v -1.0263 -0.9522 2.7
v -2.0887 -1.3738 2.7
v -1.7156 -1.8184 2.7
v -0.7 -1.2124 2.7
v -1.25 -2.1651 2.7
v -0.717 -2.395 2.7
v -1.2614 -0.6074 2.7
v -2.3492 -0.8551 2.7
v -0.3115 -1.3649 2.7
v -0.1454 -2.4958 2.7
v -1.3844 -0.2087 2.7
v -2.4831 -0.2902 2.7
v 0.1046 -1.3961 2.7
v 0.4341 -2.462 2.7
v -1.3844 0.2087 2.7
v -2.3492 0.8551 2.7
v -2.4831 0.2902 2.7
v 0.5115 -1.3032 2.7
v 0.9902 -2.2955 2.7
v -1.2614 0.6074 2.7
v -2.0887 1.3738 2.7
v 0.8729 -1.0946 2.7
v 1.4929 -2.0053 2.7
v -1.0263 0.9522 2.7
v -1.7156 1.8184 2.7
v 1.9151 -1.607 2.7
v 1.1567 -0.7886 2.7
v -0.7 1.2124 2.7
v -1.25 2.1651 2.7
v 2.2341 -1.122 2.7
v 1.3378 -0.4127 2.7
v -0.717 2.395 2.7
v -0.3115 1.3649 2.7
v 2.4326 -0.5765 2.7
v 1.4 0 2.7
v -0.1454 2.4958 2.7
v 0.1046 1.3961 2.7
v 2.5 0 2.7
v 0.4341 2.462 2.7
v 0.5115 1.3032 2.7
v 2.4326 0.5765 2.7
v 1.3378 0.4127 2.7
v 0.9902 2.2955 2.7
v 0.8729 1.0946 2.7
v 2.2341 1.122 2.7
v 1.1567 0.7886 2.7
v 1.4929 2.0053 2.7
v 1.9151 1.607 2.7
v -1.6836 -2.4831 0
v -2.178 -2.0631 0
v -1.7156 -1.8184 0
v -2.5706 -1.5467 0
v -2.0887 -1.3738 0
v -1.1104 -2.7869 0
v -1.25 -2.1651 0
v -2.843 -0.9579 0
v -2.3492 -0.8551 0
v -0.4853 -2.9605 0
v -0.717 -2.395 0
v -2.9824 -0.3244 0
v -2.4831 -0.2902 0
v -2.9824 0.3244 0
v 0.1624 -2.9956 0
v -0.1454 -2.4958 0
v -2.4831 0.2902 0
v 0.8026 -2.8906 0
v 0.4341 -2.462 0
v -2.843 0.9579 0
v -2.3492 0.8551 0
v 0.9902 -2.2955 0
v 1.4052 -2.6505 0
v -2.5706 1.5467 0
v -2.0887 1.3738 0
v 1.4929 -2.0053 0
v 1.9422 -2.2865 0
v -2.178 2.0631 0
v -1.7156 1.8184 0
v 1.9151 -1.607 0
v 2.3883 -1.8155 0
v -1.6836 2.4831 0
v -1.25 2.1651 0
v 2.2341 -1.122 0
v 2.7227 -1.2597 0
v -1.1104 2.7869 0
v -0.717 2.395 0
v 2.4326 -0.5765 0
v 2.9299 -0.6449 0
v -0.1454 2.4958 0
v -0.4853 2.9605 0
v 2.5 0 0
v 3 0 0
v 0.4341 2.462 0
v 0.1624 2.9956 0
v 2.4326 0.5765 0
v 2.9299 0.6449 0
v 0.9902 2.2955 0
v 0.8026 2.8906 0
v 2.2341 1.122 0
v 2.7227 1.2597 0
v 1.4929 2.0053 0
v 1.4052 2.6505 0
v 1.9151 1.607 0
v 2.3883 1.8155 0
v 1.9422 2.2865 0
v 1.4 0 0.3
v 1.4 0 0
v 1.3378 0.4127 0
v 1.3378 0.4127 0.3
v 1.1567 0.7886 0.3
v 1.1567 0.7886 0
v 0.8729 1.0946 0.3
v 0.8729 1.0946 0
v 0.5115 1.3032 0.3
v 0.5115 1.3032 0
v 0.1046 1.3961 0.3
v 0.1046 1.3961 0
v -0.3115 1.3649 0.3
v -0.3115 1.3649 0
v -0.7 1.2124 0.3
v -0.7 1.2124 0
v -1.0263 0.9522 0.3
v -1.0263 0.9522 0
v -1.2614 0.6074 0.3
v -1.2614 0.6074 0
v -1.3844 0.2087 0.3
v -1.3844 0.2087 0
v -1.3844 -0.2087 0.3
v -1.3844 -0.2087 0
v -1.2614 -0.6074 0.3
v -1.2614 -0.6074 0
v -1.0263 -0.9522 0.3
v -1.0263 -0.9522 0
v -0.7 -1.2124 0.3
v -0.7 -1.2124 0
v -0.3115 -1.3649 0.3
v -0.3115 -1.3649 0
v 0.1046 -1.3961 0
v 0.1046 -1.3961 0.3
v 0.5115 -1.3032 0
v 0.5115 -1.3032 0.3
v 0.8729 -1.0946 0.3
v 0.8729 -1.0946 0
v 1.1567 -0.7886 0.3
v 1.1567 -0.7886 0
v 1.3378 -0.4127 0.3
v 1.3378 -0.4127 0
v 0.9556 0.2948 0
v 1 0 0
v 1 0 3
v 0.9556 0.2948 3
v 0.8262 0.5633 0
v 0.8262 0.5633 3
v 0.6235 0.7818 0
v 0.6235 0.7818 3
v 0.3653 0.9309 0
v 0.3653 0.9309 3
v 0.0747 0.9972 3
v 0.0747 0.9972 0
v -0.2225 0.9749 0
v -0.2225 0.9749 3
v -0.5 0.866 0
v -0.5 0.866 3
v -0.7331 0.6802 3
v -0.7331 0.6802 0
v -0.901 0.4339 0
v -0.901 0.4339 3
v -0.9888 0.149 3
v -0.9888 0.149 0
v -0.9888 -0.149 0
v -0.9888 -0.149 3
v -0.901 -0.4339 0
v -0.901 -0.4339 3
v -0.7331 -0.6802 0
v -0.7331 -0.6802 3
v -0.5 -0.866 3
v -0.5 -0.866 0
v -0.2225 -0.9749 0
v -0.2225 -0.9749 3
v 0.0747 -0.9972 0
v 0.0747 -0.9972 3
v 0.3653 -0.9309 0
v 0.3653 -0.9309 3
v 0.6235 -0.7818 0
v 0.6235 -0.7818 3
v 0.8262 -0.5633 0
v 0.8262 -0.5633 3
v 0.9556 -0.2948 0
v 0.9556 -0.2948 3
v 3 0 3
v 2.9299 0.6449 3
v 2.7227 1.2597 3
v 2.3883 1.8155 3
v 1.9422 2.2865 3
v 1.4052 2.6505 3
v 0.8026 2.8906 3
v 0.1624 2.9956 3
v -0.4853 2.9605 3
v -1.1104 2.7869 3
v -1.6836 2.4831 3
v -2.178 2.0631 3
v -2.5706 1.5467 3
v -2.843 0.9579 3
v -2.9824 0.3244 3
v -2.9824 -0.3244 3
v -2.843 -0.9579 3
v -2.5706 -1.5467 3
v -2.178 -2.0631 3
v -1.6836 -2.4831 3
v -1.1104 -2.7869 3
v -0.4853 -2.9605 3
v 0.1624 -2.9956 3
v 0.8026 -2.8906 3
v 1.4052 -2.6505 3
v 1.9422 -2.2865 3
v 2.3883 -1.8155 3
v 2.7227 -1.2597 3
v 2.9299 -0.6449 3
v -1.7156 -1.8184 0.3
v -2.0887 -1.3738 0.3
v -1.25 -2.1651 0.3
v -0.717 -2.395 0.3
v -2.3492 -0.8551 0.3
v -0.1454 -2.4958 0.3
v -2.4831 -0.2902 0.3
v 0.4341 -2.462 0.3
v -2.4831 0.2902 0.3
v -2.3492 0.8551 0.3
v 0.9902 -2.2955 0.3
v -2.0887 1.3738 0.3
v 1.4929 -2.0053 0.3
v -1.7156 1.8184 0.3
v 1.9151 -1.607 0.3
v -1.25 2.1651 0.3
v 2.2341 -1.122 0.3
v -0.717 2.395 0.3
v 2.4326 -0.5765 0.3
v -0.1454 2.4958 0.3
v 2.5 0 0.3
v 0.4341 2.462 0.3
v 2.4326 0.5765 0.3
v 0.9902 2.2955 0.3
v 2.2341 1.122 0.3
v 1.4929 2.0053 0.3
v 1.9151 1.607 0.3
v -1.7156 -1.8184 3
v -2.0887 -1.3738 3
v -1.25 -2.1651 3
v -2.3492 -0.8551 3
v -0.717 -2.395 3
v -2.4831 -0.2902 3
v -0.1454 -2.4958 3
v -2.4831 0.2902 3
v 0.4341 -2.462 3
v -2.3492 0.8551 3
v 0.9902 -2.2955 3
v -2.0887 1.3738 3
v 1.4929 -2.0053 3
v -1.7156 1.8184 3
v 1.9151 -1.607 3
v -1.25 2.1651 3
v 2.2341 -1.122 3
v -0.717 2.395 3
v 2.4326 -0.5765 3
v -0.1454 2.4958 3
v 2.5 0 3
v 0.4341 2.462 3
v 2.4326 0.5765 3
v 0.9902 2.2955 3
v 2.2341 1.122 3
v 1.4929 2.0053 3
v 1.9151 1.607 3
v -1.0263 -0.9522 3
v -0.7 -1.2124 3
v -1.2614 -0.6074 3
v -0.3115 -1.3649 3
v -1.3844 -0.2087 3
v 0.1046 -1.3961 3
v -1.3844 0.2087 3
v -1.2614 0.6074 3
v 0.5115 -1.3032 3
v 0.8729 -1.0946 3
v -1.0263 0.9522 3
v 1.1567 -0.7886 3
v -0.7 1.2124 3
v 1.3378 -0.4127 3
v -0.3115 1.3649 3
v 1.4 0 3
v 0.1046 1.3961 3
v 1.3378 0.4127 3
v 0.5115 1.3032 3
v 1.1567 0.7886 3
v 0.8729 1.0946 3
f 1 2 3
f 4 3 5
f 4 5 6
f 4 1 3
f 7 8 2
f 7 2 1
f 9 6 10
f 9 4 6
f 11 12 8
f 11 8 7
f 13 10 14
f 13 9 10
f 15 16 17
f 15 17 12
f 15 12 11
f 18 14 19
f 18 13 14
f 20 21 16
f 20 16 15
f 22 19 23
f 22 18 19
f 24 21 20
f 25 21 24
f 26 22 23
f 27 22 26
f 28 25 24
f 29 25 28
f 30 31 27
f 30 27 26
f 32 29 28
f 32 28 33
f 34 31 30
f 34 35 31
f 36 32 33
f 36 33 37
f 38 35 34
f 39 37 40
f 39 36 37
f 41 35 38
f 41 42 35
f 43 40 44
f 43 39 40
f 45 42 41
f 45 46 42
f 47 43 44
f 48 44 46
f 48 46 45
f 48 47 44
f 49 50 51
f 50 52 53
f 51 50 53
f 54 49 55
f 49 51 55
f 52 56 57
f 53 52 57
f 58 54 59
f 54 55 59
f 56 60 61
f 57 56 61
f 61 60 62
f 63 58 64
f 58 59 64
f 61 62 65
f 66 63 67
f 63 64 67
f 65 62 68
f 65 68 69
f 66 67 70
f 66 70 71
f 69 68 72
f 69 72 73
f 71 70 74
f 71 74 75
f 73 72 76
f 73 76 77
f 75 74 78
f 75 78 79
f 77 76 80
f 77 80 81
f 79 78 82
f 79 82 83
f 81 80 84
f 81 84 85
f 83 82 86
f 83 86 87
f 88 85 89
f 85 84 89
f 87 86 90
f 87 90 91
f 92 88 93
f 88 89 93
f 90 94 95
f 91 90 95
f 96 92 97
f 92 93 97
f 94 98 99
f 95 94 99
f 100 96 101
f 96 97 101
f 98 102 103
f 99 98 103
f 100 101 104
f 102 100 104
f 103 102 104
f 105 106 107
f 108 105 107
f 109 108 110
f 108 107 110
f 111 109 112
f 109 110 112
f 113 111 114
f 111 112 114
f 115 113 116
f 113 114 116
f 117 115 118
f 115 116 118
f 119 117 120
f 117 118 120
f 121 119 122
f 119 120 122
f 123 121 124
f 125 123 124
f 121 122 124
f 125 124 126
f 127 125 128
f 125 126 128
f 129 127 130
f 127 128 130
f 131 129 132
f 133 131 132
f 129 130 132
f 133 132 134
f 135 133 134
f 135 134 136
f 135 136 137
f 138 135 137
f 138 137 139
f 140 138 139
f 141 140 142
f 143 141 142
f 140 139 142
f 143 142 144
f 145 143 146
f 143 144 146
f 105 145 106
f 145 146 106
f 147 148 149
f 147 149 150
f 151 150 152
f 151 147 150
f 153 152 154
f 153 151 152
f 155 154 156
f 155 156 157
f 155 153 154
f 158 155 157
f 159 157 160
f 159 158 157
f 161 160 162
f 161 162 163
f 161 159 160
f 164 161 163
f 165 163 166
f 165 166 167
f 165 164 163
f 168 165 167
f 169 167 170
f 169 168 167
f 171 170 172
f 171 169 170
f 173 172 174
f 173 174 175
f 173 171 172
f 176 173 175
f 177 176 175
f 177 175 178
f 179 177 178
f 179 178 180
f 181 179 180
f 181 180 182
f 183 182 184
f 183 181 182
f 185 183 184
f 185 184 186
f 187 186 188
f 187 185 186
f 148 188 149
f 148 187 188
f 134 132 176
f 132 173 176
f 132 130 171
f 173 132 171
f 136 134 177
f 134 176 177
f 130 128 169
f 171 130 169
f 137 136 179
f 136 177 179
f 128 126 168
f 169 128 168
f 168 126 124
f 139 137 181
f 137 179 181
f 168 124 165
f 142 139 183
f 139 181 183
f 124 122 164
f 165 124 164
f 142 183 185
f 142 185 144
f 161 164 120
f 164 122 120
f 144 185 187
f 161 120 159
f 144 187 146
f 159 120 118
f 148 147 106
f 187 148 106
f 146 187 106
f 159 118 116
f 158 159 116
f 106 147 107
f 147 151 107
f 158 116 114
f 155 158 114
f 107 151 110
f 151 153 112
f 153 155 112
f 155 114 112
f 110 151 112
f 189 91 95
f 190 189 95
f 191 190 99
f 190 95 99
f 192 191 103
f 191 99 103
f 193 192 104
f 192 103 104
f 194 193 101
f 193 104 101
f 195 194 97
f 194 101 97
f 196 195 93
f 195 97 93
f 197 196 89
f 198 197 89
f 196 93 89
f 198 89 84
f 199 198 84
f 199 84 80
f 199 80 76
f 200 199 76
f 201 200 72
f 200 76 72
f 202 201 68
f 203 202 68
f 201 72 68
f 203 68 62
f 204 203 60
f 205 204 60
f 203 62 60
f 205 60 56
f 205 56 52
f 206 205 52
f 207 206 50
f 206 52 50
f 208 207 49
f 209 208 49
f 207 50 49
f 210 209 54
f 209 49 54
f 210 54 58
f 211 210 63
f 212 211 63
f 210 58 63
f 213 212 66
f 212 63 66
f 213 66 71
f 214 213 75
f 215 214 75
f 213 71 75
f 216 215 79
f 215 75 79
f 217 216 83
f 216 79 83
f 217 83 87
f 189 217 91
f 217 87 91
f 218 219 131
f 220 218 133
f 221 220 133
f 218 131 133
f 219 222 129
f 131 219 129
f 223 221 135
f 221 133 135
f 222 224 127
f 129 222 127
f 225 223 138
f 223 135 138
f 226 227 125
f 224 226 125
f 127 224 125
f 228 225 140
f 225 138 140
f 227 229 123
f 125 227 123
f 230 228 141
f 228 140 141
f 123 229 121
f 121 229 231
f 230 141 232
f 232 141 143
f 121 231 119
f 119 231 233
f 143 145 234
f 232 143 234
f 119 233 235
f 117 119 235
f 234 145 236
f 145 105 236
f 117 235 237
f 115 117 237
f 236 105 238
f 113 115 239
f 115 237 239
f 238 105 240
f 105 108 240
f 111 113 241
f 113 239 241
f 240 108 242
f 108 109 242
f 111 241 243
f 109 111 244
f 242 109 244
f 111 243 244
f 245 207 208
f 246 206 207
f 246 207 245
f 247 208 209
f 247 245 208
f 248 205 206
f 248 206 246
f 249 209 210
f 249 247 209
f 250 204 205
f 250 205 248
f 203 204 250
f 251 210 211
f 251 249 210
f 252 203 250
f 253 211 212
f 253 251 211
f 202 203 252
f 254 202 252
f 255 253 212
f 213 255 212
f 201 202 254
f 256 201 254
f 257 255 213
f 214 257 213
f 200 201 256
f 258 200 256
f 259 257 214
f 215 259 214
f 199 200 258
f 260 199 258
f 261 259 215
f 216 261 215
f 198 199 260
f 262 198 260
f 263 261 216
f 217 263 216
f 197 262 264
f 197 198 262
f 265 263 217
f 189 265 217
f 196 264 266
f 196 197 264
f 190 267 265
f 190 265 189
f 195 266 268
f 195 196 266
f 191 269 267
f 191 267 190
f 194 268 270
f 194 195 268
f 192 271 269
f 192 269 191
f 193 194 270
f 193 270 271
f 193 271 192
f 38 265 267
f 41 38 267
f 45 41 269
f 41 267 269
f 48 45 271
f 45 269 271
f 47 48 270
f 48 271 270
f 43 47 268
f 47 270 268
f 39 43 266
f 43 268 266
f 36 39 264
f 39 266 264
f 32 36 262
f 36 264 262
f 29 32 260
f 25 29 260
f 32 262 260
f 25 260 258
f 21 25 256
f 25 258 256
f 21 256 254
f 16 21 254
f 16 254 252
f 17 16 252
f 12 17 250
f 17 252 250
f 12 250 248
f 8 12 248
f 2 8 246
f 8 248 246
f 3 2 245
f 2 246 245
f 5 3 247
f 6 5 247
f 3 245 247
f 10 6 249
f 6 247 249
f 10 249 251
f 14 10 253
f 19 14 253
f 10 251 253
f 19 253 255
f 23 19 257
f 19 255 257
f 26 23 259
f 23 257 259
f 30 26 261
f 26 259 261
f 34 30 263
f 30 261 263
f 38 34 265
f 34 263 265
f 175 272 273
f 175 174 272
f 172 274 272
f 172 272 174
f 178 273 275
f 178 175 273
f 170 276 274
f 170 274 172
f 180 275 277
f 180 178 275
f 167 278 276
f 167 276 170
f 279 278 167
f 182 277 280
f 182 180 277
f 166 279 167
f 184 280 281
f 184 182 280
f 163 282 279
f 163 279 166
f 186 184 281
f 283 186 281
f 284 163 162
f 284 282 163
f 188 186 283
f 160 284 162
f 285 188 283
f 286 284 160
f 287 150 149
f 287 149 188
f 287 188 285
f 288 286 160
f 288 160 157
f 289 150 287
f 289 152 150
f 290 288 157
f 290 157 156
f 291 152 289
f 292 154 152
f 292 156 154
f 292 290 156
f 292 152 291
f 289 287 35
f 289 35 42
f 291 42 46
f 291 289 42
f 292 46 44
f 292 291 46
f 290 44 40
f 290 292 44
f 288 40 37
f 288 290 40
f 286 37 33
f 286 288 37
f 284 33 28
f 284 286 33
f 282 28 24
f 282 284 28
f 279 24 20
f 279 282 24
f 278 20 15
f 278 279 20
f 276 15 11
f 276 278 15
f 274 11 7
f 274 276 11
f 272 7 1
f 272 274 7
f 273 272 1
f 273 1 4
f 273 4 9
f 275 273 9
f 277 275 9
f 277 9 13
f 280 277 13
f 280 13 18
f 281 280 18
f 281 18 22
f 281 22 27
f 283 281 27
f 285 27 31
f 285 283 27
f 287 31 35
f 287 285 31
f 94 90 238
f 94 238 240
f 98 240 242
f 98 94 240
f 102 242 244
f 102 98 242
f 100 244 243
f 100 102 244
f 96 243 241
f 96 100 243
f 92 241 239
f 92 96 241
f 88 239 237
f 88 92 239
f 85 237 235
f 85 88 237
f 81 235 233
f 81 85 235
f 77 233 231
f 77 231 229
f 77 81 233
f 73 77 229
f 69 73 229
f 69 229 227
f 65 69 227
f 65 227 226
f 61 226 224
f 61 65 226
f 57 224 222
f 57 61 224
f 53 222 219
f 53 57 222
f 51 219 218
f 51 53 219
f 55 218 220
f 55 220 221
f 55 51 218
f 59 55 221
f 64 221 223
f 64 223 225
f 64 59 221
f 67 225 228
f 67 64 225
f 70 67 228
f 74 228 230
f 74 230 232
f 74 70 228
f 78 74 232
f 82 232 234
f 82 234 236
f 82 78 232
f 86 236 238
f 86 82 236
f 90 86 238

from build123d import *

# Parameters (mm, degrees)
SKETCH1_R           = 3
SKETCH1_R_2         = 1
BOSS_EXTRUDE1_DEPTH = 3
SKETCH2_R           = 2.5
SKETCH2_R_2         = 1.4
CUT_EXTRUDE1_DEPTH  = 0.3
CUT_EXTRUDE2_START  = -3
SKETCH2_2_R         = 2.5
SKETCH2_2_R_2       = 1.4
CUT_EXTRUDE2_DEPTH  = 0.3


with BuildPart() as part:
    # Sketch1 → Boss-Extrude1 (new body)
    with BuildSketch(Plane.XY):
        Circle(SKETCH1_R)
        Circle(SKETCH1_R_2, mode=Mode.SUBTRACT)
    extrude(amount=BOSS_EXTRUDE1_DEPTH)

    # Sketch2 → Cut-Extrude1 (cut)
    with BuildSketch(Plane.XY.offset(3)):
        Circle(SKETCH2_R)
        Circle(SKETCH2_R_2, mode=Mode.SUBTRACT)
    extrude(amount=-CUT_EXTRUDE1_DEPTH, mode=Mode.SUBTRACT)

    # Sketch2<2> → Cut-Extrude2 (cut)
    with BuildSketch(Plane.XY.offset(3).offset(CUT_EXTRUDE2_START)):
        Circle(SKETCH2_2_R)
        Circle(SKETCH2_2_R_2, mode=Mode.SUBTRACT)
    extrude(amount=CUT_EXTRUDE2_DEPTH, mode=Mode.SUBTRACT)


solid = part.part
